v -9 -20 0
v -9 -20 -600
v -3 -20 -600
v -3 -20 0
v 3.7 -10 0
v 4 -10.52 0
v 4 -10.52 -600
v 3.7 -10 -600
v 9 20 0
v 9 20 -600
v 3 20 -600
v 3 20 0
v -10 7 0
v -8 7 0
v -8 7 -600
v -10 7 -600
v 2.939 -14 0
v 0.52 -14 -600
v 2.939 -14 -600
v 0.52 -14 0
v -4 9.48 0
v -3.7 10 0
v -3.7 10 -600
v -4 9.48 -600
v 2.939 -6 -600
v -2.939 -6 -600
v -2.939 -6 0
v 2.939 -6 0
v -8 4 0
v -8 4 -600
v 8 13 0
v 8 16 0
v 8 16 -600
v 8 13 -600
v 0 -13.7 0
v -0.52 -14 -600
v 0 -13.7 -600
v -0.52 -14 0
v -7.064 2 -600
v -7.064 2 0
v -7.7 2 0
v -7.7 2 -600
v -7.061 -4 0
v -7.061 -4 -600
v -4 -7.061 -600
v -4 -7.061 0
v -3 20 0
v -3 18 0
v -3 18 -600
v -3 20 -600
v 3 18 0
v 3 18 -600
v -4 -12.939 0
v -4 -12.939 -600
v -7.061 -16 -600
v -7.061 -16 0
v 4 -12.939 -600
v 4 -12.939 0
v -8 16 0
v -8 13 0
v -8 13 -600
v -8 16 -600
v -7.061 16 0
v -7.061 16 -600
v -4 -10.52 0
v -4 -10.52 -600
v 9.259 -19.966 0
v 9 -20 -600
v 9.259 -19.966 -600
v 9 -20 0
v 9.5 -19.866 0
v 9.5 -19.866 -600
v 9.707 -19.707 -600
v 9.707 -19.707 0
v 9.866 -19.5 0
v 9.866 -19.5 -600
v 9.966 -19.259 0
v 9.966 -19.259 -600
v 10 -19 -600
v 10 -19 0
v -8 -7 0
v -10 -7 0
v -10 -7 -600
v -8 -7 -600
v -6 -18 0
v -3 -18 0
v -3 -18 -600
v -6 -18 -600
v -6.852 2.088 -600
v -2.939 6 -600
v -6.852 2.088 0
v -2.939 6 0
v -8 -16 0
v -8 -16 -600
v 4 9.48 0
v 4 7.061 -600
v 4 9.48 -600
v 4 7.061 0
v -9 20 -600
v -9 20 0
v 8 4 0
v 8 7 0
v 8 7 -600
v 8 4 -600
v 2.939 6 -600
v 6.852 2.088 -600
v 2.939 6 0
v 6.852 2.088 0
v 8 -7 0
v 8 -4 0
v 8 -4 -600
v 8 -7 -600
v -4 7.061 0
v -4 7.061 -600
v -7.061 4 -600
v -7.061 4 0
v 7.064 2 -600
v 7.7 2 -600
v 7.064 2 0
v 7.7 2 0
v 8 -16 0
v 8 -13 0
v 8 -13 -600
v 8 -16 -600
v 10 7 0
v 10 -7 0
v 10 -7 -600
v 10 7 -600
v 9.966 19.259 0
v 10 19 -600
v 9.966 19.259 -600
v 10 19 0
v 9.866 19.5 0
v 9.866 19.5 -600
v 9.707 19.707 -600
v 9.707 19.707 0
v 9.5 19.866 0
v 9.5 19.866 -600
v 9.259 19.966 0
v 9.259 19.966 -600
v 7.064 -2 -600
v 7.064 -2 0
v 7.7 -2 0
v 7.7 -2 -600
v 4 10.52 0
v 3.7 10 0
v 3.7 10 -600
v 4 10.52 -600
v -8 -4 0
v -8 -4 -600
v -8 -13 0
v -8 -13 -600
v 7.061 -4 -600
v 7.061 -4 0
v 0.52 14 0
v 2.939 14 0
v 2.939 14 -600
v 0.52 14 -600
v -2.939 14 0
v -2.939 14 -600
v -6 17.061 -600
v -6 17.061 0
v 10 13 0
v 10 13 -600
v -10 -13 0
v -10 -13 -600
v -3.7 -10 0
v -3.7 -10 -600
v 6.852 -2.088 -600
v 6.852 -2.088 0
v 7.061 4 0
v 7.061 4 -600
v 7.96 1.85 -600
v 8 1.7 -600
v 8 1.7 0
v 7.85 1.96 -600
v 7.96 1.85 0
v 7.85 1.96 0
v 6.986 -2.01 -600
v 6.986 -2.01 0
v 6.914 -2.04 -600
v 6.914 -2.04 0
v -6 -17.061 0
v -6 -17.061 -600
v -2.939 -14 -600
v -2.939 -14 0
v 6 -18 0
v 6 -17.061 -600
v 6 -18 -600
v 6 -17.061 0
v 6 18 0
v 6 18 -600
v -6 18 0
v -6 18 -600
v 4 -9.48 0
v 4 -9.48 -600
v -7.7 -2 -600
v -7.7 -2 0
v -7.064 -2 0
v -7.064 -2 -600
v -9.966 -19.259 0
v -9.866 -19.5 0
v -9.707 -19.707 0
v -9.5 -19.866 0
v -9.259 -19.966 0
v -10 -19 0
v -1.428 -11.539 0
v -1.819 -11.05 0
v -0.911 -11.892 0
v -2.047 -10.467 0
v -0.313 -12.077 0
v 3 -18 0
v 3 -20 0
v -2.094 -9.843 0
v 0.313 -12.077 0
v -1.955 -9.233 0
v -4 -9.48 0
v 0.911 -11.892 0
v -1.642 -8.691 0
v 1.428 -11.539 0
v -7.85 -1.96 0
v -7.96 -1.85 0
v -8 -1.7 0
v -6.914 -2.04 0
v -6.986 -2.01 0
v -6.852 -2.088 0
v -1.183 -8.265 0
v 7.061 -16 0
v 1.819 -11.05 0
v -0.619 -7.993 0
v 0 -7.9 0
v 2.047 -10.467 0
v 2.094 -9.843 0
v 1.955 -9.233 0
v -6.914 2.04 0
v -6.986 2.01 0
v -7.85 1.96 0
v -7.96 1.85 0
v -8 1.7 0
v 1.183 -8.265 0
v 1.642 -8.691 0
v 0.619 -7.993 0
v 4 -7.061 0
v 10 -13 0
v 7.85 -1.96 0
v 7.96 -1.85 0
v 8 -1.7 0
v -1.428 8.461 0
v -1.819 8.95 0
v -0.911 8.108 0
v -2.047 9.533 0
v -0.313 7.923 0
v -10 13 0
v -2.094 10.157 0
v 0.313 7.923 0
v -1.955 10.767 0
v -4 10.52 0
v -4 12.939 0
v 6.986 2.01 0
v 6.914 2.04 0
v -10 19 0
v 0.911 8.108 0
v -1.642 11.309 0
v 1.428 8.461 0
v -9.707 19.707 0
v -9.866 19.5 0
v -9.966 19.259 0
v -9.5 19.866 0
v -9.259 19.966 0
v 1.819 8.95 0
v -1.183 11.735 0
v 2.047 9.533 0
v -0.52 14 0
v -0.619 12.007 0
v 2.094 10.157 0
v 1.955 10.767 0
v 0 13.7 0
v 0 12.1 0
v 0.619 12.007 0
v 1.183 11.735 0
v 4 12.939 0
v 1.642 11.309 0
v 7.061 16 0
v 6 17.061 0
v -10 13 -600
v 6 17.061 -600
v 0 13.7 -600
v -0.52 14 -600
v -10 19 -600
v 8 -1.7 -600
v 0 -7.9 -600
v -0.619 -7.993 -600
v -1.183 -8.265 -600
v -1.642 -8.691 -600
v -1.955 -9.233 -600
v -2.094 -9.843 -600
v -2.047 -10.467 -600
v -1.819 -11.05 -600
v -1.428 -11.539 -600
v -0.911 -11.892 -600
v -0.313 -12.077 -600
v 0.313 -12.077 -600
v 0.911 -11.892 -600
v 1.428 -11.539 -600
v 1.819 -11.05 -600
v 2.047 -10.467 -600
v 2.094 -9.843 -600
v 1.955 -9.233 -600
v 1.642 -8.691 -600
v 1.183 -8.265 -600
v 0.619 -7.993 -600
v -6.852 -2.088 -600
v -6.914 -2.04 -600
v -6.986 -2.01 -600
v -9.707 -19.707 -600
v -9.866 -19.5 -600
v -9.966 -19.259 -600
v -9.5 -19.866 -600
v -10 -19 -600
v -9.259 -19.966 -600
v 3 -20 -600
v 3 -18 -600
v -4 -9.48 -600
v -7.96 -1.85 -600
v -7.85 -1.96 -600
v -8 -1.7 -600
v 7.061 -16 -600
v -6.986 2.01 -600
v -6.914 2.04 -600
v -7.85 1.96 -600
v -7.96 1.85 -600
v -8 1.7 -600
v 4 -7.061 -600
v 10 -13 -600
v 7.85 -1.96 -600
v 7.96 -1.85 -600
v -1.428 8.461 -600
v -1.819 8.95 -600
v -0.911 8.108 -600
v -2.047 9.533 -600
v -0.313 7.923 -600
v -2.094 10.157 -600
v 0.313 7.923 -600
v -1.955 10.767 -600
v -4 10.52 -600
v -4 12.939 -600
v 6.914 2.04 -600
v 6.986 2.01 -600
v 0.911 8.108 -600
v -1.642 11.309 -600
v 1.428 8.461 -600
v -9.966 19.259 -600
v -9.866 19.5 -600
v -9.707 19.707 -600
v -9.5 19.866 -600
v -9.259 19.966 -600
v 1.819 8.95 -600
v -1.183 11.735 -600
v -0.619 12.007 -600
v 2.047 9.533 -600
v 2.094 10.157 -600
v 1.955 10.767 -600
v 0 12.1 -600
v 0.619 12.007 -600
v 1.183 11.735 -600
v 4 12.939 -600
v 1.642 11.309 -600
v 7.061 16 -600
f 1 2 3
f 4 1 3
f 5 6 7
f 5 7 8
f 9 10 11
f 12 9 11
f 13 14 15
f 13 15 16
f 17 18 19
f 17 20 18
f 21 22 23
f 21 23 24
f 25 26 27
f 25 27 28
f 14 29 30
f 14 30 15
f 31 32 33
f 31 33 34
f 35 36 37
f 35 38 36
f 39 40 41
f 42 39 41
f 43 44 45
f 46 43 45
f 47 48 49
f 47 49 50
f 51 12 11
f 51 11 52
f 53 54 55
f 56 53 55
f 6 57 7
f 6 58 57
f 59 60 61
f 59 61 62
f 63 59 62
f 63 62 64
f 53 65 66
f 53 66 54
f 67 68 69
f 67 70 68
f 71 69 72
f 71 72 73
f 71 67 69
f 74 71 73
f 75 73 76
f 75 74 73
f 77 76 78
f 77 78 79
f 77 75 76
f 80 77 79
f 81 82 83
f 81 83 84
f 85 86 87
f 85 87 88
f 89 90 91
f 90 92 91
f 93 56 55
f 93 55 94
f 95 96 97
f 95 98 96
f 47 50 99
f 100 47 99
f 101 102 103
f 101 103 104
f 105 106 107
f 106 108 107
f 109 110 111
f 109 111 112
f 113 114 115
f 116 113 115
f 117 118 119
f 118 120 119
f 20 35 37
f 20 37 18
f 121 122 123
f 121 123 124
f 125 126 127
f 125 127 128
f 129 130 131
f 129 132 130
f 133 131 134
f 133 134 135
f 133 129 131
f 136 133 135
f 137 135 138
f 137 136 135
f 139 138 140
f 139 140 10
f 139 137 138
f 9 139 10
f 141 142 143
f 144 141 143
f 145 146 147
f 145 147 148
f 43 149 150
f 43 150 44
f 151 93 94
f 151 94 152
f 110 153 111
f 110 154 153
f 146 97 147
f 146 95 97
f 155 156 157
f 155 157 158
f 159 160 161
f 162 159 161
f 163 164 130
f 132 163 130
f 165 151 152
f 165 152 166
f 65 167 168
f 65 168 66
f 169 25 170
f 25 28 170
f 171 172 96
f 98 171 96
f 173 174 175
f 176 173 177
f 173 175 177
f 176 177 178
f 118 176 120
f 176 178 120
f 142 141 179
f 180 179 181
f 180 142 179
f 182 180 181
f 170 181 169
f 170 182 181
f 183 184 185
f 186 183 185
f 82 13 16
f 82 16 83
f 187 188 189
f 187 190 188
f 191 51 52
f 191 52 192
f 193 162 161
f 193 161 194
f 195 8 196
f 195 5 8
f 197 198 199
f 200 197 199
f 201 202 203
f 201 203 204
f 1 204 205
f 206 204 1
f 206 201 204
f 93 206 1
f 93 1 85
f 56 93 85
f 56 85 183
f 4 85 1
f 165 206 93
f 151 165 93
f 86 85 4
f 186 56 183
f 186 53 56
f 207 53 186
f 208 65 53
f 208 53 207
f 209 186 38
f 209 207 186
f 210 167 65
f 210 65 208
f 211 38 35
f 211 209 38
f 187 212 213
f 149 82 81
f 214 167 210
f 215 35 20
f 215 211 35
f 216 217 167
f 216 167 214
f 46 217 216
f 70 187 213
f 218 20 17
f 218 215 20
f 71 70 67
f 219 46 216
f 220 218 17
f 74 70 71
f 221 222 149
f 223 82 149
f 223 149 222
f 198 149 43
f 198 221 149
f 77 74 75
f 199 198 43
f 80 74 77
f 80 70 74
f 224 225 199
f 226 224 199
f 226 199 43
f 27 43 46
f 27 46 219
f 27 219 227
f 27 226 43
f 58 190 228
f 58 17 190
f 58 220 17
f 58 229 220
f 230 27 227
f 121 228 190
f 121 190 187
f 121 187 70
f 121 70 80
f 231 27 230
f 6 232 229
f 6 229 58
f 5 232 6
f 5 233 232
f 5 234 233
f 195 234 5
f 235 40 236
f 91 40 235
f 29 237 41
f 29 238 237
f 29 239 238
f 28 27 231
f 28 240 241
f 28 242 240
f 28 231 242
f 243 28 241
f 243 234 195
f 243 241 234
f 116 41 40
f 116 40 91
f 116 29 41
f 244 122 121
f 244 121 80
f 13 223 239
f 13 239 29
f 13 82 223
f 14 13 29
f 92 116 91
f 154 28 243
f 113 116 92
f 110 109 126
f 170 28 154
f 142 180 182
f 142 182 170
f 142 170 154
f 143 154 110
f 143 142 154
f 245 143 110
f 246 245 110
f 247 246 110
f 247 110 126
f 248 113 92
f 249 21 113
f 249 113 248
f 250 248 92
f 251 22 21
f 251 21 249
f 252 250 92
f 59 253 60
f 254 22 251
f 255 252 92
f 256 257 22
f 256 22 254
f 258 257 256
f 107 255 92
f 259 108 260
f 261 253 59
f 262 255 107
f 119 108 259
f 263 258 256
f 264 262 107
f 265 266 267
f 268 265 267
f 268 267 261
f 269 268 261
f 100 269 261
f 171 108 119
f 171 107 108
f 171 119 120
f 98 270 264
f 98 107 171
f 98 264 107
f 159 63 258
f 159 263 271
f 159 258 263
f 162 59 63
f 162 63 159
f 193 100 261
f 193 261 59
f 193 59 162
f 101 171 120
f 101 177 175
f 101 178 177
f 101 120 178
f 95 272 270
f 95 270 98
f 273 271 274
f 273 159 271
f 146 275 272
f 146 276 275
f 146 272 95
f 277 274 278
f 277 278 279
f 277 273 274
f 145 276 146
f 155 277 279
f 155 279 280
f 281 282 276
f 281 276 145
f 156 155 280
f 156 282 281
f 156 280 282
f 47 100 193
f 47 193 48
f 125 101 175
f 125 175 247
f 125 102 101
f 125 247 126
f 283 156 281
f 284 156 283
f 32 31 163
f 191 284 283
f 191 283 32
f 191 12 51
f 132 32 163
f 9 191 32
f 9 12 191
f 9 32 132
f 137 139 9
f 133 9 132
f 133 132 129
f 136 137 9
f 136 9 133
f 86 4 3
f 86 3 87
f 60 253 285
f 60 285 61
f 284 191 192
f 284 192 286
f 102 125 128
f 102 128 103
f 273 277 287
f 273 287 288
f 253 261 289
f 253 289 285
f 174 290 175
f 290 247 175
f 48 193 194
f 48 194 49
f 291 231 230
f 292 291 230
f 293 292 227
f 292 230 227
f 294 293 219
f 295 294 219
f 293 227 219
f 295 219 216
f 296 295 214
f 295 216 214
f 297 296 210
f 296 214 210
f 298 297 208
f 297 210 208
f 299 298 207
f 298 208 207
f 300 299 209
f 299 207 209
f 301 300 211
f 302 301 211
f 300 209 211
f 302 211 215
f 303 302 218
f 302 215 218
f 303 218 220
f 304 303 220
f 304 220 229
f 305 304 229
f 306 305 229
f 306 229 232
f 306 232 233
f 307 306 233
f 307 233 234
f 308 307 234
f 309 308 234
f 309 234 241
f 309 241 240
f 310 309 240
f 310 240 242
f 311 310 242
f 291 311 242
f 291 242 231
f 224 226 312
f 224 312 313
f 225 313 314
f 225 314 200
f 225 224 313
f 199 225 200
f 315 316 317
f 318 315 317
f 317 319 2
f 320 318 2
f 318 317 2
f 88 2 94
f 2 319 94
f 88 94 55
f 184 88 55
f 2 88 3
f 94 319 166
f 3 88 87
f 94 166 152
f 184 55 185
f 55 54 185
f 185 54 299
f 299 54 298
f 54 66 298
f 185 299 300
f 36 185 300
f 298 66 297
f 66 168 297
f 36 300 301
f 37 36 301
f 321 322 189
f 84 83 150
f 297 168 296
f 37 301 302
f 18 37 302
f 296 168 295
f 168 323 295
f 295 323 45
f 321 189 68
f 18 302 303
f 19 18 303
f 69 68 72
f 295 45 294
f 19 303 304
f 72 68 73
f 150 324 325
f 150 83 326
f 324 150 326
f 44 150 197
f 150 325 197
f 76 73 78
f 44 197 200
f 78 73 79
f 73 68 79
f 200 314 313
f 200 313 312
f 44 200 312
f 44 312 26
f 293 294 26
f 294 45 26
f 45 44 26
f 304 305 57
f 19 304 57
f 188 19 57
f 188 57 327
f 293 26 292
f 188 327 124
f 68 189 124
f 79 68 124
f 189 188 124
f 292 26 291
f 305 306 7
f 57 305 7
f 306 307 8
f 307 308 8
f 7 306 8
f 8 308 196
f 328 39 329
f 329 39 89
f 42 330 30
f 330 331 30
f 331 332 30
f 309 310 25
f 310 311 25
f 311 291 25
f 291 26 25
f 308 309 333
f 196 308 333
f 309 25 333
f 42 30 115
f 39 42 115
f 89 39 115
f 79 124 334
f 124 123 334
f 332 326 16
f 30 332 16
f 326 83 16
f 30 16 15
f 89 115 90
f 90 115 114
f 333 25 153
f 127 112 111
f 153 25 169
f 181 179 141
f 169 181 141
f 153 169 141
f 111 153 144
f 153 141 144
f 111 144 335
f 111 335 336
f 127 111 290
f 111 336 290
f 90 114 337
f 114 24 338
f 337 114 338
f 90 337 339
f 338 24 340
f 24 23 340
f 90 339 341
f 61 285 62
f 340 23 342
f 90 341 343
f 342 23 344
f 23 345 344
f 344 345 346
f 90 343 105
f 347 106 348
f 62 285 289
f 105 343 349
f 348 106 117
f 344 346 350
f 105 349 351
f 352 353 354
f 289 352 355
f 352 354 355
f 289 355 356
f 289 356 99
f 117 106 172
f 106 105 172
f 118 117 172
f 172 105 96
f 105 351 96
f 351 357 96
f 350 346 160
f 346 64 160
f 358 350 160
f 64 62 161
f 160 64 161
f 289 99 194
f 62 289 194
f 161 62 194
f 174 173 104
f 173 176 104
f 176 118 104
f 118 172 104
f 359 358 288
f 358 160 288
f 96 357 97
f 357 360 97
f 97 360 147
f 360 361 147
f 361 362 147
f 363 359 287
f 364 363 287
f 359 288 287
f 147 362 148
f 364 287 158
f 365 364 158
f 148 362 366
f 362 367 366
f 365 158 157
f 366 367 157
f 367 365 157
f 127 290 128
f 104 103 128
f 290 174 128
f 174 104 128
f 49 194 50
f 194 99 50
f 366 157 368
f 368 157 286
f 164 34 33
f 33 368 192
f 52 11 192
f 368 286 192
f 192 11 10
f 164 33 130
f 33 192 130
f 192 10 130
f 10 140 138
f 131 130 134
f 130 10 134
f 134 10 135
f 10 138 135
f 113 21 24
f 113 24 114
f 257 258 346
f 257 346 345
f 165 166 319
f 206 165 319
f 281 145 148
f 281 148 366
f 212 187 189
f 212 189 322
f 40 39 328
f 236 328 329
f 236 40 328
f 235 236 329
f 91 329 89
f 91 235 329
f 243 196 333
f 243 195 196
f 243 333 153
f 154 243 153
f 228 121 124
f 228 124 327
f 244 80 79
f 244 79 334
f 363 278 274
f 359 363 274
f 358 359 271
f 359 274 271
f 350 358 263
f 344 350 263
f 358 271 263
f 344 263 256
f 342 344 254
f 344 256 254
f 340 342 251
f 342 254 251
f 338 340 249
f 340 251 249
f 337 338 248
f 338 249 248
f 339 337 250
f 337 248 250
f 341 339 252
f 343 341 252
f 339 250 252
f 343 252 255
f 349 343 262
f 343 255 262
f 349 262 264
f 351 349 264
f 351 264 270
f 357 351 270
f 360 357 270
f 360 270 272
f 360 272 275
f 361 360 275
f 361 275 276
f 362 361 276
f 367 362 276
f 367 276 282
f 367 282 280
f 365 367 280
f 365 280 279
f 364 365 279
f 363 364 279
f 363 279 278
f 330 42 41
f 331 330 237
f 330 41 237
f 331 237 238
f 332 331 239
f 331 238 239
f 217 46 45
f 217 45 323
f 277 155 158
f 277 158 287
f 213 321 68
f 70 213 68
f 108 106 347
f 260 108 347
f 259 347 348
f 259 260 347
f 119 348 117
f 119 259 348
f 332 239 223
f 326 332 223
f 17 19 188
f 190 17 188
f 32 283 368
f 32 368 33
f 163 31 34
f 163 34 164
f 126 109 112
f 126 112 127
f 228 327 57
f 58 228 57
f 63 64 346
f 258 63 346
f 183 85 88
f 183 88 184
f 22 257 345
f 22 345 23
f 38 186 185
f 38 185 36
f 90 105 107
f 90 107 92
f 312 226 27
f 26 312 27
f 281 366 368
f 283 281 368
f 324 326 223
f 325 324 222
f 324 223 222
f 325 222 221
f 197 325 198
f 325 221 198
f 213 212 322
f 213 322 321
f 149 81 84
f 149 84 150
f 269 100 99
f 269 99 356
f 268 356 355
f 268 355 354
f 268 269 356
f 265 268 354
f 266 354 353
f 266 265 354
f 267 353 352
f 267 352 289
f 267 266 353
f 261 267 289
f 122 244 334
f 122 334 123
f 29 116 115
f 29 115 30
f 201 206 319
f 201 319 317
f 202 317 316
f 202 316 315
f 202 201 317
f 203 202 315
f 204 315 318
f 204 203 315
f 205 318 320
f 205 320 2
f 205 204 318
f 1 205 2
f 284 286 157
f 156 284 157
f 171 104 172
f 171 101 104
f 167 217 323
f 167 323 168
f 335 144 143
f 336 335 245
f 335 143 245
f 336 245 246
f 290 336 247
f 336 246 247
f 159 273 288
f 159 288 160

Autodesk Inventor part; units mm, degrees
sketch "Sketch_1" plane through (0, 0, 0) normal (0, 0, 1) x (1, 0, 0)
  line L0 (-10, -7) -> (-8, -7)
  line L1 (-8, -7) -> (-8, -4)
  line L2 (-8, -4) -> (-7.0607, -4)
  line L3 (-7.0607, -4) -> (-4, -7.0607)
  line L4 (-4, -7.0607) -> (-4, -9.4804)
  line L5 (-4, -9.4804) -> (-3.7, -10)
  line L6 (-3.7, -10) -> (-4, -10.5196)
  line L7 (-4, -10.5196) -> (-4, -12.9393)
  line L8 (-4, -12.9393) -> (-7.0607, -16)
  line L9 (-7.0607, -16) -> (-8, -16)
  line L10 (-8, -16) -> (-8, -13)
  line L11 (-8, -13) -> (-10, -13)
  line L12 (-10, -13) -> (-10, -19)
  arc A0 (-10, -19) -> (-9, -20) centre (-9, -19) ccw
  line L13 (-9, -20) -> (-3, -20)
  line L14 (-3, -20) -> (-3, -18)
  line L15 (-3, -18) -> (-6, -18)
  line L16 (-6, -18) -> (-6, -17.0607)
  line L17 (-6, -17.0607) -> (-2.9393, -14)
  line L18 (-2.9393, -14) -> (-0.5196, -14)
  line L19 (-0.5196, -14) -> (0, -13.7)
  line L20 (0, -13.7) -> (0.5196, -14)
  line L21 (0.5196, -14) -> (2.9393, -14)
  line L22 (2.9393, -14) -> (6, -17.0607)
  line L23 (6, -17.0607) -> (6, -18)
  line L24 (6, -18) -> (3, -18)
  line L25 (3, -18) -> (3, -20)
  line L26 (3, -20) -> (9, -20)
  arc A1 (9, -20) -> (10, -19) centre (9, -19) ccw
  line L27 (10, -19) -> (10, -13)
  line L28 (10, -13) -> (8, -13)
  line L29 (8, -13) -> (8, -16)
  line L30 (8, -16) -> (7.0607, -16)
  line L31 (7.0607, -16) -> (4, -12.9393)
  line L32 (4, -12.9393) -> (4, -10.5196)
  line L33 (4, -10.5196) -> (3.7, -10)
  line L34 (3.7, -10) -> (4, -9.4804)
  line L35 (4, -9.4804) -> (4, -7.0607)
  line L36 (4, -7.0607) -> (7.0607, -4)
  line L37 (7.0607, -4) -> (8, -4)
  line L38 (8, -4) -> (8, -7)
  line L39 (8, -7) -> (10, -7)
  line L40 (10, -7) -> (10, 7)
  line L41 (10, 7) -> (8, 7)
  line L42 (8, 7) -> (8, 4)
  line L43 (8, 4) -> (7.0607, 4)
  line L44 (7.0607, 4) -> (4, 7.0607)
  line L45 (4, 7.0607) -> (4, 9.4804)
  line L46 (4, 9.4804) -> (3.7, 10)
  line L47 (3.7, 10) -> (4, 10.5196)
  line L48 (4, 10.5196) -> (4, 12.9393)
  line L49 (4, 12.9393) -> (7.0607, 16)
  line L50 (7.0607, 16) -> (8, 16)
  line L51 (8, 16) -> (8, 13)
  line L52 (8, 13) -> (10, 13)
  line L53 (10, 13) -> (10, 19)
  arc A2 (10, 19) -> (9, 20) centre (9, 19) ccw
  line L54 (9, 20) -> (3, 20)
  line L55 (3, 20) -> (3, 18)
  line L56 (3, 18) -> (6, 18)
  line L57 (6, 18) -> (6, 17.0607)
  line L58 (6, 17.0607) -> (2.9393, 14)
  line L59 (2.9393, 14) -> (0.5196, 14)
  line L60 (0.5196, 14) -> (0, 13.7)
  line L61 (0, 13.7) -> (-0.5196, 14)
  line L62 (-0.5196, 14) -> (-2.9393, 14)
  line L63 (-2.9393, 14) -> (-6, 17.0607)
  line L64 (-6, 17.0607) -> (-6, 18)
  line L65 (-6, 18) -> (-3, 18)
  line L66 (-3, 18) -> (-3, 20)
  line L67 (-3, 20) -> (-9, 20)
  arc A3 (-9, 20) -> (-10, 19) centre (-9, 19) ccw
  line L68 (-10, 19) -> (-10, 13)
  line L69 (-10, 13) -> (-8, 13)
  line L70 (-8, 13) -> (-8, 16)
  line L71 (-8, 16) -> (-7.0607, 16)
  line L72 (-7.0607, 16) -> (-4, 12.9393)
  line L73 (-4, 12.9393) -> (-4, 10.5196)
  line L74 (-4, 10.5196) -> (-3.7, 10)
  line L75 (-3.7, 10) -> (-4, 9.4804)
  line L76 (-4, 9.4804) -> (-4, 7.0607)
  line L77 (-4, 7.0607) -> (-7.0607, 4)
  line L78 (-7.0607, 4) -> (-8, 4)
  line L79 (-8, 4) -> (-8, 7)
  line L80 (-8, 7) -> (-10, 7)
  line L81 (-10, 7) -> (-10, -7)
  line L82 (-8, 1.7) -> (-8, -1.7)
  arc A4 (-8, -1.7) -> (-7.7, -2) centre (-7.7, -1.7) ccw
  line L83 (-7.7, -2) -> (-7.0636, -2)
  arc A5 (-6.8515, -2.0879) -> (-7.0636, -2) centre (-7.0636, -2.3) ccw
  line L84 (-6.8515, -2.0879) -> (-2.9393, -6)
  line L85 (-2.9393, -6) -> (2.9393, -6)
  line L86 (2.9393, -6) -> (6.8515, -2.0879)
  arc A6 (7.0636, -2) -> (6.8515, -2.0879) centre (7.0636, -2.3) ccw
  line L87 (7.0636, -2) -> (7.7, -2)
  arc A7 (7.7, -2) -> (8, -1.7) centre (7.7, -1.7) ccw
  line L88 (8, -1.7) -> (8, 1.7)
  arc A8 (8, 1.7) -> (7.7, 2) centre (7.7, 1.7) ccw
  line L89 (7.7, 2) -> (7.0636, 2)
  arc A9 (6.8515, 2.0879) -> (7.0636, 2) centre (7.0636, 2.3) ccw
  line L90 (6.8515, 2.0879) -> (2.9393, 6)
  line L91 (2.9393, 6) -> (-2.9393, 6)
  line L92 (-2.9393, 6) -> (-6.8515, 2.0879)
  arc A10 (-7.0636, 2) -> (-6.8515, 2.0879) centre (-7.0636, 2.3) ccw
  line L93 (-7.0636, 2) -> (-7.7, 2)
  arc A11 (-7.7, 2) -> (-8, 1.7) centre (-7.7, 1.7) ccw
extrude "Extrusion1" add sketch "Sketch_1" against normal blind 600
sketch "Sketch2" plane through (0, 0, -600) normal (0, 0, -1) x (-1, 0, 0)
  point P0 (0, 10)
hole "Hole1" at (0, 10, -600) direction (0, 0, 1) diameter 4.2 depth 600
pattern_linear "Rectangular Pattern1" count 2 spacing 20 along (0, -1, 0) of "Hole1"
ref_plane "C1_XY" through (0, 0, 0) normal (0, 0, 1) x (1, 0, 0)
ref_plane "C1_YZ" through (0, 0, 0) normal (1, 0, 0) x (0, 1, 0)
ref_plane "C1_ZX" through (0, 0, 0) normal (0, 1, 0) x (0, 0, 1)
properties part number "HFS5-2040-600"
